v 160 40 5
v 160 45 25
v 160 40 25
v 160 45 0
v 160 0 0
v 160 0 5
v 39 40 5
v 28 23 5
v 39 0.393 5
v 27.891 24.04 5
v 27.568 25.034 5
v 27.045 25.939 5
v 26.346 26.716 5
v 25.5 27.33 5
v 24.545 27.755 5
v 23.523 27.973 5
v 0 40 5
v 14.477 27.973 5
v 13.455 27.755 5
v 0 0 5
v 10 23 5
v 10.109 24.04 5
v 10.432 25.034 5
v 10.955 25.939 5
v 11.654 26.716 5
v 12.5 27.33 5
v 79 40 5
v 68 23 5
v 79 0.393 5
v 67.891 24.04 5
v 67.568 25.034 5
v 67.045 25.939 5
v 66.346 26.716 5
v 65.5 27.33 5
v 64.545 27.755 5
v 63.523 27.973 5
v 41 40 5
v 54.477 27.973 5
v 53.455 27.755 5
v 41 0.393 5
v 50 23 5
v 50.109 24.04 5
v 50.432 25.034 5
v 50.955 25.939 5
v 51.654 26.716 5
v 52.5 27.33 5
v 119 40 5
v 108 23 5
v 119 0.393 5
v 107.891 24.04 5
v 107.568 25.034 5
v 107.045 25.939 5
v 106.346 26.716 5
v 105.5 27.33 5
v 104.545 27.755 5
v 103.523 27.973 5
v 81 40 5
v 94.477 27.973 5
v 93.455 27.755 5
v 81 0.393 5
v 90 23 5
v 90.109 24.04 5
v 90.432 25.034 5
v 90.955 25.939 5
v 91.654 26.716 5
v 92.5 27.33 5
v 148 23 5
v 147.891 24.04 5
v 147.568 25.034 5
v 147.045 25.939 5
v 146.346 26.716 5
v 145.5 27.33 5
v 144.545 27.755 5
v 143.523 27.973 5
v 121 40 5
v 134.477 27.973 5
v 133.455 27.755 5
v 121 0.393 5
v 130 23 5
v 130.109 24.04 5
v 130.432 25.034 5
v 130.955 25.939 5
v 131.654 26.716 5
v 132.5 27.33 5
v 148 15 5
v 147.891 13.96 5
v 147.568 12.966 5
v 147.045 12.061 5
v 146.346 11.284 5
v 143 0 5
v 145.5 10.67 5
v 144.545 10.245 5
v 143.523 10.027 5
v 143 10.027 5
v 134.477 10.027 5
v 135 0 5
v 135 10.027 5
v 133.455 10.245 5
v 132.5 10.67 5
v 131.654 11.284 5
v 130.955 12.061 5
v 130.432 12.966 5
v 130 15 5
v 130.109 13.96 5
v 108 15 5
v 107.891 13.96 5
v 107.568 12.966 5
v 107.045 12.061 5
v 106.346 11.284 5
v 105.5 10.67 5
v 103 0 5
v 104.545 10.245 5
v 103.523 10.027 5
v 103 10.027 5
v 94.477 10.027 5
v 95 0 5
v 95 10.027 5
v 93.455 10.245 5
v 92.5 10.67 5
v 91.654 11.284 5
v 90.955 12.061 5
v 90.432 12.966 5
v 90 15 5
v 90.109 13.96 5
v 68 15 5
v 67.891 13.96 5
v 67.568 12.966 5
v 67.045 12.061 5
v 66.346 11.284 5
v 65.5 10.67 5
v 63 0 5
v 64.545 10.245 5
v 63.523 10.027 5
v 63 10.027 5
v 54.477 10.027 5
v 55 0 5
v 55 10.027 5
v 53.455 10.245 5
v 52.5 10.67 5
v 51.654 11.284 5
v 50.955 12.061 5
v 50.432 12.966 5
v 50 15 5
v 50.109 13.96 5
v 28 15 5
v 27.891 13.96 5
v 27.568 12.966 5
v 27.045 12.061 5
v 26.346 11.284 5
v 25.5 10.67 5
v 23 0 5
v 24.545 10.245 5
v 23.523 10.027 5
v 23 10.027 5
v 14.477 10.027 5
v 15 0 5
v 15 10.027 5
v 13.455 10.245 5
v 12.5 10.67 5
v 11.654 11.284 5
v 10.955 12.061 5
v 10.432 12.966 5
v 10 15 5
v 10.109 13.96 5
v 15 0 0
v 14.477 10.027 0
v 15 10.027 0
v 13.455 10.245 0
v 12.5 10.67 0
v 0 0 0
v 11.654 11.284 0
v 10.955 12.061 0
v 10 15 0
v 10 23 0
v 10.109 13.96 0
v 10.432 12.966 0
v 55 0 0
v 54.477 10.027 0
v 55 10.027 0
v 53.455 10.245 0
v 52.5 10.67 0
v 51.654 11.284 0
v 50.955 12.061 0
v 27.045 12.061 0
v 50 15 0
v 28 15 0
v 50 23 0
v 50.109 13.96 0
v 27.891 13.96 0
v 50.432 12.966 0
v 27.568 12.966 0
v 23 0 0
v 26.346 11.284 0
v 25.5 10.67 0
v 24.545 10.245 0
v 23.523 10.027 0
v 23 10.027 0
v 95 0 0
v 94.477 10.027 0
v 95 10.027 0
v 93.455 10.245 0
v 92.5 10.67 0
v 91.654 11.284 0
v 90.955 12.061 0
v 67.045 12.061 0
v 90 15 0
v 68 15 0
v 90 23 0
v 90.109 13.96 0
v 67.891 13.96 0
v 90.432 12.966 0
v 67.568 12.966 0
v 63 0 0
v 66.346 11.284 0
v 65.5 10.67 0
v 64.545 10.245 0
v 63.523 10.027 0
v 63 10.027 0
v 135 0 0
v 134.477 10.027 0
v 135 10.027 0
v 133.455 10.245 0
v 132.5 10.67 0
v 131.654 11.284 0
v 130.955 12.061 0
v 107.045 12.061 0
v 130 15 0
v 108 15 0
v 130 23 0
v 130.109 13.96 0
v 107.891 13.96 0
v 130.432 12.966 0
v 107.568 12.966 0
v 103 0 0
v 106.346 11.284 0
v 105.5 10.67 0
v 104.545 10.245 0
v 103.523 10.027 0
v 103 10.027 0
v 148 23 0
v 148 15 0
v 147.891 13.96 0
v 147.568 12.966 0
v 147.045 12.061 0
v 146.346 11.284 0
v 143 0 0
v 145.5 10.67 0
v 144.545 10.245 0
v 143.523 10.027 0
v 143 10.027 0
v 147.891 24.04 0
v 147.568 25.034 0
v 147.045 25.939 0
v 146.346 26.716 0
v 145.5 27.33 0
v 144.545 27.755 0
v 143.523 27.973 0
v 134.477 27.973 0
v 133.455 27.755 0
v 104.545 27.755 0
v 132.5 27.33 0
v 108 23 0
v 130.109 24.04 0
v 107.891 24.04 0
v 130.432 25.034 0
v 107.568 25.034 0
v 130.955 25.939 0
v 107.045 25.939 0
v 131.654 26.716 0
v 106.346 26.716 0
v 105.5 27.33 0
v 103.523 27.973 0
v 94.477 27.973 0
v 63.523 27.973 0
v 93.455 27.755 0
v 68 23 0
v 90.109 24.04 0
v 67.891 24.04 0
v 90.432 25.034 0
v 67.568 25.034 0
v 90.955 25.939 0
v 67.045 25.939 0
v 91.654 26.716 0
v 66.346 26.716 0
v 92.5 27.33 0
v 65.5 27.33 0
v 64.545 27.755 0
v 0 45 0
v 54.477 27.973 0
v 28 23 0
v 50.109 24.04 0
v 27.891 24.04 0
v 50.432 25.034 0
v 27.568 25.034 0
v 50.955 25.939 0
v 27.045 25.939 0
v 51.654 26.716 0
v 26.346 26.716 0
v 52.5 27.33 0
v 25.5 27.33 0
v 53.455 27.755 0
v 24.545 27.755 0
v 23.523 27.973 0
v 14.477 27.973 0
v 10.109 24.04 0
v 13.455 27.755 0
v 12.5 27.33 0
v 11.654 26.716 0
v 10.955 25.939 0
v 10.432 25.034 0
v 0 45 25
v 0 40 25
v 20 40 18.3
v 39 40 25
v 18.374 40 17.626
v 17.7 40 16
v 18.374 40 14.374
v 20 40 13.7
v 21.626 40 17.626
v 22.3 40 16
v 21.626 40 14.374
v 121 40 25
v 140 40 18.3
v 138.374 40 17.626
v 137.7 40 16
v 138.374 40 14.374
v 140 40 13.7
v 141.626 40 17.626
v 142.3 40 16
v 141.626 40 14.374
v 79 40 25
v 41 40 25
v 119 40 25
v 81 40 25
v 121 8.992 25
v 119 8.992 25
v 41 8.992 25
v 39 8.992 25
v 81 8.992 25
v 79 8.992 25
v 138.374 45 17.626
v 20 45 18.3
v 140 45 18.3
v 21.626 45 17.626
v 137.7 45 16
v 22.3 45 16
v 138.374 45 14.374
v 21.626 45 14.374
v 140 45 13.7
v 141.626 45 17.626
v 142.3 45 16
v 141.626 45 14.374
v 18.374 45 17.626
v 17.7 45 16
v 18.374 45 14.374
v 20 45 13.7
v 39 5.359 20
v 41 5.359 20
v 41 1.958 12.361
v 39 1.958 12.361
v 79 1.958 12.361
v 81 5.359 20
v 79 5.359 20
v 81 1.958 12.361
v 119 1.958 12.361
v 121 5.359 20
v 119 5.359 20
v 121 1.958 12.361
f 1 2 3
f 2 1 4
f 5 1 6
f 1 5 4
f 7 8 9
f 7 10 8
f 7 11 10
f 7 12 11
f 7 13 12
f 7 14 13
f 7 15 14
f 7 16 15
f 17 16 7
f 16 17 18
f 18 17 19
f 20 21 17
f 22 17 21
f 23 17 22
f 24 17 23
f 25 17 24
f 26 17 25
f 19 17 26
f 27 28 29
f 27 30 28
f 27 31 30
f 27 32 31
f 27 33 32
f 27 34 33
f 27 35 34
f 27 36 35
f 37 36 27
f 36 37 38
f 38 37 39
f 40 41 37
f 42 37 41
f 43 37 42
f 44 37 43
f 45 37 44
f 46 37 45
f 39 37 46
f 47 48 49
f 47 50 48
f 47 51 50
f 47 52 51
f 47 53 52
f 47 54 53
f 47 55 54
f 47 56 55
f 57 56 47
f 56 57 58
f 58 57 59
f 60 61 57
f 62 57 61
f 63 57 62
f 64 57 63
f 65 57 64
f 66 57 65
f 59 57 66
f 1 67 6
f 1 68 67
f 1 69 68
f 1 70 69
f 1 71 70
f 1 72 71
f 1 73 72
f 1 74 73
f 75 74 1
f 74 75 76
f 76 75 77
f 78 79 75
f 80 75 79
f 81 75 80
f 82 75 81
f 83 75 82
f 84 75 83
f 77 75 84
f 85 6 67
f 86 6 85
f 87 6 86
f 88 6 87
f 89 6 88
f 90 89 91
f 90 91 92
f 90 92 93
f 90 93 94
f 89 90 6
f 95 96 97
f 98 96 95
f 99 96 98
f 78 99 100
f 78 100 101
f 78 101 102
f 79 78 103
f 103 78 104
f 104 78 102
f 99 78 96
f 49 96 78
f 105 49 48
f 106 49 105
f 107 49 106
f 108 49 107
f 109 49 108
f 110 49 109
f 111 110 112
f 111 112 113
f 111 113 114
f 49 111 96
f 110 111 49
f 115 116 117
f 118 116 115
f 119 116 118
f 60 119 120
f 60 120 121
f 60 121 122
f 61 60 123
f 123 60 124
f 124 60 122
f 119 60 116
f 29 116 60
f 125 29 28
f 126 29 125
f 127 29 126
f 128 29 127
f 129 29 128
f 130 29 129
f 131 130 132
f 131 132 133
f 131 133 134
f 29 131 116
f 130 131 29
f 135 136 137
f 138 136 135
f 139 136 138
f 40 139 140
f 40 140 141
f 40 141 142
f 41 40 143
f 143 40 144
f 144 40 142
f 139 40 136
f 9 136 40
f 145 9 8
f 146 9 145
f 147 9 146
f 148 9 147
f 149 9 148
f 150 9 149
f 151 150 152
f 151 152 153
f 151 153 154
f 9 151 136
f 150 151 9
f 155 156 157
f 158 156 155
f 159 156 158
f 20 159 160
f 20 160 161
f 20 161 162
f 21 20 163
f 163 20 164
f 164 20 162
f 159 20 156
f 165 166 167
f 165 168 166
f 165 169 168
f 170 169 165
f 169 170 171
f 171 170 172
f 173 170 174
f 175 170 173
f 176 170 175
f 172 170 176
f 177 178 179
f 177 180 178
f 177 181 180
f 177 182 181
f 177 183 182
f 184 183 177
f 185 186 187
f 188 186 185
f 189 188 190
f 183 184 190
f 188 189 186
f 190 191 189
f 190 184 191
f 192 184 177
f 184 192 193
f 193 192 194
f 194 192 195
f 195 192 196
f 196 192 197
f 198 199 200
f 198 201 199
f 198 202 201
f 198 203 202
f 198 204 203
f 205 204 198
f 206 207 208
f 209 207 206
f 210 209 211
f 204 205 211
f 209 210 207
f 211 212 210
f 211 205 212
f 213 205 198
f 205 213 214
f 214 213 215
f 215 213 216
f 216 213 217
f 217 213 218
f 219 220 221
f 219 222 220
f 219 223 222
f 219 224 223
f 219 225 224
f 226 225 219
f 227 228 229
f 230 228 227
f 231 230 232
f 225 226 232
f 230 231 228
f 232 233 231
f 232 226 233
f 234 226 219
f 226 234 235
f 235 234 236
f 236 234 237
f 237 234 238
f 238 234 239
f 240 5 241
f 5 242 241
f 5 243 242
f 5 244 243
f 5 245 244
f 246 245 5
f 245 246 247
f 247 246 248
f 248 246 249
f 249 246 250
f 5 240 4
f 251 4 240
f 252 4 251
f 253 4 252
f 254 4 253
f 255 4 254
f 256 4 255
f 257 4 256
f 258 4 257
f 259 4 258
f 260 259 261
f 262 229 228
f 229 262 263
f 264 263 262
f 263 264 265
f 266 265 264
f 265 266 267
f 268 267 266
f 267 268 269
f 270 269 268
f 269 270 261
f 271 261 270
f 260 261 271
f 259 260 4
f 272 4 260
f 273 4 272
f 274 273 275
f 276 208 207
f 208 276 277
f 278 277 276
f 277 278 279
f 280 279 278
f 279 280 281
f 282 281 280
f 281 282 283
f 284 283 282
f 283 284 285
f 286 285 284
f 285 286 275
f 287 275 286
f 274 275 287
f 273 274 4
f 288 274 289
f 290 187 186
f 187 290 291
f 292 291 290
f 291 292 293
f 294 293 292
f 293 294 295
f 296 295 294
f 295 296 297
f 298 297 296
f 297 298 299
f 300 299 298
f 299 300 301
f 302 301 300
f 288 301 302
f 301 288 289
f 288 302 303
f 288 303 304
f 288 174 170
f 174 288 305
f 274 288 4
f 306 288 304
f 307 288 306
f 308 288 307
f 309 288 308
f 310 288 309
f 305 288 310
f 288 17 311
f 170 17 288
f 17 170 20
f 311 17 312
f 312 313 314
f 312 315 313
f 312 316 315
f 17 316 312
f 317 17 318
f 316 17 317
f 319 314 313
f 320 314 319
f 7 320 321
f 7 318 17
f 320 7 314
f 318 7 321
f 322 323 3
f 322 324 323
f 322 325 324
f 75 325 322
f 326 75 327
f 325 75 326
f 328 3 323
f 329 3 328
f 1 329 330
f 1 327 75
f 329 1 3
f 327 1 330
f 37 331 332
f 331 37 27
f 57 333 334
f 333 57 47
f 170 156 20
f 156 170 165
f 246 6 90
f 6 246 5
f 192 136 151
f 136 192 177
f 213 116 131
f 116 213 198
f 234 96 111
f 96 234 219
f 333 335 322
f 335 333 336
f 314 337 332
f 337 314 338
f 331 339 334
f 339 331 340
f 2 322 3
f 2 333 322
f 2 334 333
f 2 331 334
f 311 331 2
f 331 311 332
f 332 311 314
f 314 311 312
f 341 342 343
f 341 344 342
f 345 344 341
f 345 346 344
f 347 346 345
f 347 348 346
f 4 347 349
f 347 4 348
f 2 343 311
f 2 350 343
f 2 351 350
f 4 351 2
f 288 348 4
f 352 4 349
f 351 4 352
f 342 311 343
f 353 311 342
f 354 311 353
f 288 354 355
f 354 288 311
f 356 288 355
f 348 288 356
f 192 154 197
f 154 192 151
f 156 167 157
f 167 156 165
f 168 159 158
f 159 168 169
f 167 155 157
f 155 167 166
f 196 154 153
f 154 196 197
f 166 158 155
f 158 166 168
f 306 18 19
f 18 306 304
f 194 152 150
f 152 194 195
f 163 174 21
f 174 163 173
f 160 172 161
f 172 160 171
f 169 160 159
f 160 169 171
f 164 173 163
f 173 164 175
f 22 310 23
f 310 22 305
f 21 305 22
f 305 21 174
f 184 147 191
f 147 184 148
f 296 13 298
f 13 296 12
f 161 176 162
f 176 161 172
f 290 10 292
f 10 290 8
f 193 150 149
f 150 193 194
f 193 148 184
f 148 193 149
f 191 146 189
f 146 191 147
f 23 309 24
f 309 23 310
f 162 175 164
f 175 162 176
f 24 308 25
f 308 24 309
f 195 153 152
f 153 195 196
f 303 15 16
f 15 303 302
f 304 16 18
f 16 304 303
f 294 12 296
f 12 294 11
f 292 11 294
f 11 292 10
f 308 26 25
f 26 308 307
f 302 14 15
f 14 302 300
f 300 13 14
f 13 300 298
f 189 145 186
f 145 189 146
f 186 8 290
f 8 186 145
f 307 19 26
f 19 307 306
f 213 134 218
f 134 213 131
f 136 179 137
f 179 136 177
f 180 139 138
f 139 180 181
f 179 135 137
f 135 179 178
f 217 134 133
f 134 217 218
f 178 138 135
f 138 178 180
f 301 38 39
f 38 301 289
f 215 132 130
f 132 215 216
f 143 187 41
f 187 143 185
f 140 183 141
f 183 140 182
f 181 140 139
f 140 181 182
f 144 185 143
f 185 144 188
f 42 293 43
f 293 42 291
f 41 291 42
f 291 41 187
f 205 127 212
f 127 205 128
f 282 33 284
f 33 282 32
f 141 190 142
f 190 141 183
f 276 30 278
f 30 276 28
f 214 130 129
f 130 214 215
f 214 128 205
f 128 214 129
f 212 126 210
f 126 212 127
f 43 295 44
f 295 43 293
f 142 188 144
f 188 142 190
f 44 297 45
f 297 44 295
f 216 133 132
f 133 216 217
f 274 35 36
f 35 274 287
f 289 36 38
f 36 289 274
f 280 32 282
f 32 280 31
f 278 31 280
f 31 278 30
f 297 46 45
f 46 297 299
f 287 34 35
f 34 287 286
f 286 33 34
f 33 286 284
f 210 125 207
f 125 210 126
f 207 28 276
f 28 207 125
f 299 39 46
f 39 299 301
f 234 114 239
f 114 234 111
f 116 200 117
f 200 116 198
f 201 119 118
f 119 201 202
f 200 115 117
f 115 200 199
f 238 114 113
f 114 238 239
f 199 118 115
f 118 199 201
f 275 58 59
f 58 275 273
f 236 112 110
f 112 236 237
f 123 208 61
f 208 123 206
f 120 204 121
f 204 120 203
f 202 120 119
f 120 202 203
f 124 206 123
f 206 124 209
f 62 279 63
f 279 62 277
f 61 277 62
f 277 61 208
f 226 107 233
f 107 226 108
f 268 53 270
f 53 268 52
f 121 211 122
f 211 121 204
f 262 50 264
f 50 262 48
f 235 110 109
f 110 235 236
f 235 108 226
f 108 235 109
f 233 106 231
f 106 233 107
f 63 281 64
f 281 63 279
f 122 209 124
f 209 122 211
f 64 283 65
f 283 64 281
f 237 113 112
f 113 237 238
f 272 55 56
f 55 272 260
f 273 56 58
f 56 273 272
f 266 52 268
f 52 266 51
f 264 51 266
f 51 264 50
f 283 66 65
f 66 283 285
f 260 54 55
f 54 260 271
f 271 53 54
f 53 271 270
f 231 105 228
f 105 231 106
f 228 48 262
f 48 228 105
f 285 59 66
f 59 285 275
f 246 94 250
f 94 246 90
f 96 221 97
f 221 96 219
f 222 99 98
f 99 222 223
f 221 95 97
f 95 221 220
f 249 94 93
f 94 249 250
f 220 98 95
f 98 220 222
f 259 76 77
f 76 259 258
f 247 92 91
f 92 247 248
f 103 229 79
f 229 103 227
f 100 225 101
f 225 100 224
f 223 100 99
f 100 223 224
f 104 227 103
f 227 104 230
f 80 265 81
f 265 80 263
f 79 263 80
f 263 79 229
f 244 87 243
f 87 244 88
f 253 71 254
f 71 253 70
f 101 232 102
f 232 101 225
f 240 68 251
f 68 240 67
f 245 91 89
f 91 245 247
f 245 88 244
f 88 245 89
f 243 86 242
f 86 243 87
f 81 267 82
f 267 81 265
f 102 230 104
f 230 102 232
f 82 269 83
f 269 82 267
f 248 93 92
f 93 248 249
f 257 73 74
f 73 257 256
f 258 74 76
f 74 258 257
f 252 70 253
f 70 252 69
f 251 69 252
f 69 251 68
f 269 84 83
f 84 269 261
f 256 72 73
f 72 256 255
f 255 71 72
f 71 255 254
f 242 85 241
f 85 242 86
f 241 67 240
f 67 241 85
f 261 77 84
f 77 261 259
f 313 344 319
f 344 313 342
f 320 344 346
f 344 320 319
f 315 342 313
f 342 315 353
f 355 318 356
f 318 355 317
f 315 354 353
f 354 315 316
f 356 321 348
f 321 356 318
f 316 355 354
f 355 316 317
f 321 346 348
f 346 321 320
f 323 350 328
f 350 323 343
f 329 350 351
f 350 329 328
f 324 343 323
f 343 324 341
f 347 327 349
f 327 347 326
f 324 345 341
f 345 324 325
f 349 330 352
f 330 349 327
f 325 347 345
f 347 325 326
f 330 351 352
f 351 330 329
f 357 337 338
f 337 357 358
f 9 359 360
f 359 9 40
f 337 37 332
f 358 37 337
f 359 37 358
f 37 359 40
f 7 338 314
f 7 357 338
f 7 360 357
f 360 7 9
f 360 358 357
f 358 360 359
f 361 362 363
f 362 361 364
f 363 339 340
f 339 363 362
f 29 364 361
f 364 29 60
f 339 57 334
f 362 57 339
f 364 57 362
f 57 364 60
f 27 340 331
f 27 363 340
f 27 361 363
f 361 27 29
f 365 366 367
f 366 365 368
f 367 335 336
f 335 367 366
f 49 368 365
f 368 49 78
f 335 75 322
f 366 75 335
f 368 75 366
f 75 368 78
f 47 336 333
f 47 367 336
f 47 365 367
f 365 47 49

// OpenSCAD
/*

This script generates a powercord support for your workbench

More info: 
www.alexporto.com

*/


// Call support, passing the number of cords you want to hold with this suppport

support(4);


// Here is the rest of the code. You probably won't need to change anything below this line

module support(numHoles = 5)
{
    difference() {
        base (numHoles);
        for (a =[0:numHoles]) {
            hole(a);
        }
        
        // screw holes
        rotate([90,0,0])        
        translate([20, 16, -50])    
        cylinder(h=100, r1=2.3, r2=2.3);        
        rotate([90,0,0])        
        translate([numHoles * 40 - 20, 16, -50])    
        cylinder(h=100, r1=2.3, r2=2.3);               
    }    
    
    // winglets
    for (a =[1:numHoles-1]) {            
        winglet(a, numHoles);
    }
}

module winglet(pos = 0, numHoles = 5)
{
    difference () {
        rotate([0,90,0])        
        translate([0, 40, pos * 40 -1 ])    
        cylinder(h=2, r1=40, r2=40);

        translate([pos * 40 - 5, 0,-40])    
        cube ([10,50,40]);
        translate([pos * 40 - 5, 45,-40])    
        cube ([10,50,100]);     
        
        translate([0,0,25])
        cube([40 * numHoles, 100, 35]);       
        
    }
}

module base(numHoles = 5) 
{    
    cube([40 * numHoles, 40, 5]);
    translate([0,40,0])
    cube([40 * numHoles, 5, 25]);
}

module hole(pos = 0)  
{
    translate([(pos) * 40 + 15,-2,-2])
    cube([8,25,10]); 
    translate([(pos) * 40 + 10,10,-2])    
    round_cube(l=18, w=18, h=20);
}

module round_cube(l=40,w=30,h=20,r=5,$fn=30){
	hull(){ 
		translate ([r, r, 0]) cylinder (h = h, r=r);
		translate ([r, w-r, 0]) cylinder (h = h, r=r);
		translate ([l-r,w-r, 0]) cylinder (h = h, r=r);
		translate ([l-r, r, 0]) cylinder (h = h, r=r);
	}
}
